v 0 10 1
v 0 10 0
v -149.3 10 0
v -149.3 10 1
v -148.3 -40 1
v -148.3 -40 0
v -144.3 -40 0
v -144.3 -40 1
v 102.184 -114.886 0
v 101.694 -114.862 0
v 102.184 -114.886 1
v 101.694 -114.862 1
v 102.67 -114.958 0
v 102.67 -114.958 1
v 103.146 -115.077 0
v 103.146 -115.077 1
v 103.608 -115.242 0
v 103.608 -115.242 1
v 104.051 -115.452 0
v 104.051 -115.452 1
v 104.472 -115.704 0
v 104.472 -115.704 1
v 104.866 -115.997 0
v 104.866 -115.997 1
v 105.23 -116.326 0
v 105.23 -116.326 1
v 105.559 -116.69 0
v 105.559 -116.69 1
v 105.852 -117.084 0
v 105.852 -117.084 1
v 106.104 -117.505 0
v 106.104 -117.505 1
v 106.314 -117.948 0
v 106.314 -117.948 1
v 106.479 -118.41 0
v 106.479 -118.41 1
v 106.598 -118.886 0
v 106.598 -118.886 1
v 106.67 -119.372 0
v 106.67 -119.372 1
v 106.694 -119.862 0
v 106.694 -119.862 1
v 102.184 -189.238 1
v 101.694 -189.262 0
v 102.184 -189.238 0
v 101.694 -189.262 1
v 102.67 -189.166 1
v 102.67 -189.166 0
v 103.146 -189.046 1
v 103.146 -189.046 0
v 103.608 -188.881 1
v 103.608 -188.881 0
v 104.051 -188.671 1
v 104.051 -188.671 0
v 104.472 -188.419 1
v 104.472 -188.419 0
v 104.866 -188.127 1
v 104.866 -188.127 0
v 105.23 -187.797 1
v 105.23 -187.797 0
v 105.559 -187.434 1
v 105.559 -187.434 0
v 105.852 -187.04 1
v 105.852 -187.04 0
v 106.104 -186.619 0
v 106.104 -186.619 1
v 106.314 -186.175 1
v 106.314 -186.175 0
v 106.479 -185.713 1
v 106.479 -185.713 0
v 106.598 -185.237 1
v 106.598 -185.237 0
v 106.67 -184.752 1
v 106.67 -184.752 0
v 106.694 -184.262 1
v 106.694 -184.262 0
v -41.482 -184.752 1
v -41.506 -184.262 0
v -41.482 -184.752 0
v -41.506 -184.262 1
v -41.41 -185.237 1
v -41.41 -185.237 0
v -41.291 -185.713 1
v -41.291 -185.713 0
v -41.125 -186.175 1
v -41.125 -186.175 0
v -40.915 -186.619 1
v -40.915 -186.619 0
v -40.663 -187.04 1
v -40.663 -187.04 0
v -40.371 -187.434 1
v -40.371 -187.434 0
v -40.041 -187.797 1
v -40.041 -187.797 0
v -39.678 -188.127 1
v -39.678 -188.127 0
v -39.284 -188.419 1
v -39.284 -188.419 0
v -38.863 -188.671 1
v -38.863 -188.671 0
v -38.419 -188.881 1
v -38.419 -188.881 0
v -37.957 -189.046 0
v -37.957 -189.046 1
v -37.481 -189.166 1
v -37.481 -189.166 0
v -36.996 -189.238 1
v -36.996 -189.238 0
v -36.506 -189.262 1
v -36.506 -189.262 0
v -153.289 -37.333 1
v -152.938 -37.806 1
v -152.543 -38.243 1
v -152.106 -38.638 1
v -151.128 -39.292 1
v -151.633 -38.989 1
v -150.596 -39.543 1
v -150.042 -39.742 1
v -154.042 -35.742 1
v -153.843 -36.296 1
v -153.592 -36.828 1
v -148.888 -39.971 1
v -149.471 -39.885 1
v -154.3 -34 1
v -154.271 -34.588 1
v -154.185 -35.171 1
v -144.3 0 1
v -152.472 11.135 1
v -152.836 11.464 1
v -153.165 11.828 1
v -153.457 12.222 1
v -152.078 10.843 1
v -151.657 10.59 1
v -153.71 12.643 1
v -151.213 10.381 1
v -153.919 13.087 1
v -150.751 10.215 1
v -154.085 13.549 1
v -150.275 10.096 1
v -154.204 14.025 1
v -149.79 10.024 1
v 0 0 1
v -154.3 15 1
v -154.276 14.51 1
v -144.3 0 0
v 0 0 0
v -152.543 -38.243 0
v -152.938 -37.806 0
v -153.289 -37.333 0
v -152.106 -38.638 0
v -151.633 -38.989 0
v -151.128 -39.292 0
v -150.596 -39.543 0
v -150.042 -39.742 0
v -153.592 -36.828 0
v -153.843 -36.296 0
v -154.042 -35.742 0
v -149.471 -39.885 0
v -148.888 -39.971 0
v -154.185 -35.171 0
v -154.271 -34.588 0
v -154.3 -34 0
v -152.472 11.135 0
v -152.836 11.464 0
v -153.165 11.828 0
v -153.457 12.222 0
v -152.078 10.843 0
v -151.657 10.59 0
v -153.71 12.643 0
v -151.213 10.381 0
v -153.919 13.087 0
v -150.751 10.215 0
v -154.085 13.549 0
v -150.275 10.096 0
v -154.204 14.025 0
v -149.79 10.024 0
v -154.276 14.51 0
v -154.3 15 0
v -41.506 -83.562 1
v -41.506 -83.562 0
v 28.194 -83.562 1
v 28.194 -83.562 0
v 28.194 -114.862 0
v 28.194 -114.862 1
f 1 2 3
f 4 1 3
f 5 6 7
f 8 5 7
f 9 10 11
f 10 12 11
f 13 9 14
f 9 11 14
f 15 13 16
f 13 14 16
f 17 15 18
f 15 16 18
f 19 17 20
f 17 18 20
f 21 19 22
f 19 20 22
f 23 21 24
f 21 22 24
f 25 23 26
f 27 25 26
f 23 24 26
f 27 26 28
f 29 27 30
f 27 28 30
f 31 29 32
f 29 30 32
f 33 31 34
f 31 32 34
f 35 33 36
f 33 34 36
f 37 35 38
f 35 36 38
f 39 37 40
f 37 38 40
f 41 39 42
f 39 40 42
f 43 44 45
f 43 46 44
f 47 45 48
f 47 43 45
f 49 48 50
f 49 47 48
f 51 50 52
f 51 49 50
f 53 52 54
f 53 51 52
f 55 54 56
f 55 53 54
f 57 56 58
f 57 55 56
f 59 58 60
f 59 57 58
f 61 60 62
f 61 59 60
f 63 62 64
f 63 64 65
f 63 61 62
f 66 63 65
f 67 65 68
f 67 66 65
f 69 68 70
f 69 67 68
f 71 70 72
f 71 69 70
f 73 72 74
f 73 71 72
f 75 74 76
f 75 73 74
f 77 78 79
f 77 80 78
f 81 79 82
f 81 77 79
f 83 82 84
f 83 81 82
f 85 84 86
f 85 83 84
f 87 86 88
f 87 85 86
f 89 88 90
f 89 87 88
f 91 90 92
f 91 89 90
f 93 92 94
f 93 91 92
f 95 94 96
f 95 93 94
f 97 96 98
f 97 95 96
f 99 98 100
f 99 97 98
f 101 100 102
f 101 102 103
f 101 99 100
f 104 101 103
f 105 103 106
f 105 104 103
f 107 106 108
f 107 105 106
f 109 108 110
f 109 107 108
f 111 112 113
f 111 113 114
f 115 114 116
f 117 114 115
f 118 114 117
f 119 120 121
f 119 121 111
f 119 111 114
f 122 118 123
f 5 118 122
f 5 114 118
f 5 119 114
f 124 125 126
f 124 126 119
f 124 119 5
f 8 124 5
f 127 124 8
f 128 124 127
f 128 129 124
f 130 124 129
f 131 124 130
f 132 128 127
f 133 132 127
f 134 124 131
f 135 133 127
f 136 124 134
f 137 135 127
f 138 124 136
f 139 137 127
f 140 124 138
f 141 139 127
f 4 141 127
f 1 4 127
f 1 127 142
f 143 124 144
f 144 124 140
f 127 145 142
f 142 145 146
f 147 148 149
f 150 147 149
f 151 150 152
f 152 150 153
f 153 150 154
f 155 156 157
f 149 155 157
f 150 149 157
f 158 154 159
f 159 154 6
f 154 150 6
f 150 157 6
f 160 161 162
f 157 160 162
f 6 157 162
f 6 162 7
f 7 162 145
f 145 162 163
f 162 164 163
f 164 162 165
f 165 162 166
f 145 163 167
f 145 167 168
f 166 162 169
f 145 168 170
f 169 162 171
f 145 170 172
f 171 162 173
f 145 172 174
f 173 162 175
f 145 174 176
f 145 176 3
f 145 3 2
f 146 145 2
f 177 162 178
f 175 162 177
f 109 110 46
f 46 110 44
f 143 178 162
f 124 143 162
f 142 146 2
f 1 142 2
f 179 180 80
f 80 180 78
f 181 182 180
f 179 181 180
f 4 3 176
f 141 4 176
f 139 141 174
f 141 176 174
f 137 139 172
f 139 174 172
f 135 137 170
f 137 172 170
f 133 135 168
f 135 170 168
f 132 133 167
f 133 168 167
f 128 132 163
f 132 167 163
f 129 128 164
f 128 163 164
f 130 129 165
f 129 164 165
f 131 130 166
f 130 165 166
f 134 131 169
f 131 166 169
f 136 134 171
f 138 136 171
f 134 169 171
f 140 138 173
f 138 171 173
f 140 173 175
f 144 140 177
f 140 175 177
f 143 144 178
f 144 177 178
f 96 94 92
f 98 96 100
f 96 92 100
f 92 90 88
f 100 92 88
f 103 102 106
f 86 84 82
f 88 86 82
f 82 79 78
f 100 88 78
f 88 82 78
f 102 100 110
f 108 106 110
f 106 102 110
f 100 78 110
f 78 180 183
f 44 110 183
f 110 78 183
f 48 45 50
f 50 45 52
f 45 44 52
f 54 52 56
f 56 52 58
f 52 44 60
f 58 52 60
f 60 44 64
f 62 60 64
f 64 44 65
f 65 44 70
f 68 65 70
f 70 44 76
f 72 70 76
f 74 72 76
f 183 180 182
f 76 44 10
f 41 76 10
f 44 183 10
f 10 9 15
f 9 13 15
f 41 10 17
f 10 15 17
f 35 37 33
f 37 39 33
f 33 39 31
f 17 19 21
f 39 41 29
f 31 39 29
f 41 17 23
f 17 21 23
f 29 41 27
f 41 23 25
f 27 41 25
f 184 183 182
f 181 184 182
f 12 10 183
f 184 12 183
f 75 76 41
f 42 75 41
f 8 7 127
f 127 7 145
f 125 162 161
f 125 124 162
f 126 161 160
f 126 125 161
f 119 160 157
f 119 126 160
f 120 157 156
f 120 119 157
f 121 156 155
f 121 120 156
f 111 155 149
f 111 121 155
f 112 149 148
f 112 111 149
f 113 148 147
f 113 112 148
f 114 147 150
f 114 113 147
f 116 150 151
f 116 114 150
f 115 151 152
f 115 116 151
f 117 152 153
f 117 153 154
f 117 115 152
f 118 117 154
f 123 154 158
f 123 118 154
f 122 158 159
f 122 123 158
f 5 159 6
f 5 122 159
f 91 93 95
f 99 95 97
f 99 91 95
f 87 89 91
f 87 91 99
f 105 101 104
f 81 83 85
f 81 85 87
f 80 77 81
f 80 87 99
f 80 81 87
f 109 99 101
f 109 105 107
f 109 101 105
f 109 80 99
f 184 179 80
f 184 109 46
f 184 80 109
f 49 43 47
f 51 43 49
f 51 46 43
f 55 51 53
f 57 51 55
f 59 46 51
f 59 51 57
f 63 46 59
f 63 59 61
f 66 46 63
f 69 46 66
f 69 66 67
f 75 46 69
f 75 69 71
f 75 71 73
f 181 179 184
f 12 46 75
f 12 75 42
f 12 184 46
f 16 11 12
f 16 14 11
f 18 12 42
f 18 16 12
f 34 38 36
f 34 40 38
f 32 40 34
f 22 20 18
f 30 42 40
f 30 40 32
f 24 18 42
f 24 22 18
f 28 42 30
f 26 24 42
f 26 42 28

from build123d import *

# Parameters (mm, degrees)
F0_W     = 10
F0_H     = 40
F1_DEPTH = 1
F2_DEPTH = 1
F3_R     = 5
F4_R     = 6


with BuildPart() as f1:
    # F0 (on Top) → F1 (new body)
    with BuildSketch(Plane.XY):
        Polygon((-149.3, 10), (-154.3, 10), (-154.3, 0), (-144.3, 0), (0, 0), (0, 10), align=None)
        with BuildLine():
            Line((-154.3, 15), (-154.3, 10))
            Line((-154.3, 10), (-149.3, 10))
            ThreePointArc((-149.3, 10), (-152.835534, 11.464466), (-154.3, 15))
        make_face()
        with Locations((-149.3, -20)):
            Rectangle(F0_W, F0_H)
    extrude(amount=F1_DEPTH)

    # F4
    f4_edges = [f1.edges().sort_by_distance(p)[0] for p in [
        (-154.3, -40, 0.5),
    ]]
    fillet(f4_edges, radius=F4_R)


with BuildPart() as f2:
    # F0 (on Top) → F2 (new body)
    with BuildSketch(Plane.XY):
        Polygon((106.69418, -114.861763), (28.19418, -114.861763), (28.19418, -83.561763), (-41.50582, -83.561763), (-41.50582, -189.261763), (106.69418, -189.261763), align=None)
    extrude(amount=F2_DEPTH)

    # F3
    f3_edges = [f2.edges().sort_by_distance(p)[0] for p in [
        (-41.50582, -189.261763, 0.5),
        (106.69418, -189.261763, 0.5),
        (106.69418, -114.861763, 0.5),
    ]]
    fillet(f3_edges, radius=F3_R)


solid = Compound([f1.part, f2.part])
